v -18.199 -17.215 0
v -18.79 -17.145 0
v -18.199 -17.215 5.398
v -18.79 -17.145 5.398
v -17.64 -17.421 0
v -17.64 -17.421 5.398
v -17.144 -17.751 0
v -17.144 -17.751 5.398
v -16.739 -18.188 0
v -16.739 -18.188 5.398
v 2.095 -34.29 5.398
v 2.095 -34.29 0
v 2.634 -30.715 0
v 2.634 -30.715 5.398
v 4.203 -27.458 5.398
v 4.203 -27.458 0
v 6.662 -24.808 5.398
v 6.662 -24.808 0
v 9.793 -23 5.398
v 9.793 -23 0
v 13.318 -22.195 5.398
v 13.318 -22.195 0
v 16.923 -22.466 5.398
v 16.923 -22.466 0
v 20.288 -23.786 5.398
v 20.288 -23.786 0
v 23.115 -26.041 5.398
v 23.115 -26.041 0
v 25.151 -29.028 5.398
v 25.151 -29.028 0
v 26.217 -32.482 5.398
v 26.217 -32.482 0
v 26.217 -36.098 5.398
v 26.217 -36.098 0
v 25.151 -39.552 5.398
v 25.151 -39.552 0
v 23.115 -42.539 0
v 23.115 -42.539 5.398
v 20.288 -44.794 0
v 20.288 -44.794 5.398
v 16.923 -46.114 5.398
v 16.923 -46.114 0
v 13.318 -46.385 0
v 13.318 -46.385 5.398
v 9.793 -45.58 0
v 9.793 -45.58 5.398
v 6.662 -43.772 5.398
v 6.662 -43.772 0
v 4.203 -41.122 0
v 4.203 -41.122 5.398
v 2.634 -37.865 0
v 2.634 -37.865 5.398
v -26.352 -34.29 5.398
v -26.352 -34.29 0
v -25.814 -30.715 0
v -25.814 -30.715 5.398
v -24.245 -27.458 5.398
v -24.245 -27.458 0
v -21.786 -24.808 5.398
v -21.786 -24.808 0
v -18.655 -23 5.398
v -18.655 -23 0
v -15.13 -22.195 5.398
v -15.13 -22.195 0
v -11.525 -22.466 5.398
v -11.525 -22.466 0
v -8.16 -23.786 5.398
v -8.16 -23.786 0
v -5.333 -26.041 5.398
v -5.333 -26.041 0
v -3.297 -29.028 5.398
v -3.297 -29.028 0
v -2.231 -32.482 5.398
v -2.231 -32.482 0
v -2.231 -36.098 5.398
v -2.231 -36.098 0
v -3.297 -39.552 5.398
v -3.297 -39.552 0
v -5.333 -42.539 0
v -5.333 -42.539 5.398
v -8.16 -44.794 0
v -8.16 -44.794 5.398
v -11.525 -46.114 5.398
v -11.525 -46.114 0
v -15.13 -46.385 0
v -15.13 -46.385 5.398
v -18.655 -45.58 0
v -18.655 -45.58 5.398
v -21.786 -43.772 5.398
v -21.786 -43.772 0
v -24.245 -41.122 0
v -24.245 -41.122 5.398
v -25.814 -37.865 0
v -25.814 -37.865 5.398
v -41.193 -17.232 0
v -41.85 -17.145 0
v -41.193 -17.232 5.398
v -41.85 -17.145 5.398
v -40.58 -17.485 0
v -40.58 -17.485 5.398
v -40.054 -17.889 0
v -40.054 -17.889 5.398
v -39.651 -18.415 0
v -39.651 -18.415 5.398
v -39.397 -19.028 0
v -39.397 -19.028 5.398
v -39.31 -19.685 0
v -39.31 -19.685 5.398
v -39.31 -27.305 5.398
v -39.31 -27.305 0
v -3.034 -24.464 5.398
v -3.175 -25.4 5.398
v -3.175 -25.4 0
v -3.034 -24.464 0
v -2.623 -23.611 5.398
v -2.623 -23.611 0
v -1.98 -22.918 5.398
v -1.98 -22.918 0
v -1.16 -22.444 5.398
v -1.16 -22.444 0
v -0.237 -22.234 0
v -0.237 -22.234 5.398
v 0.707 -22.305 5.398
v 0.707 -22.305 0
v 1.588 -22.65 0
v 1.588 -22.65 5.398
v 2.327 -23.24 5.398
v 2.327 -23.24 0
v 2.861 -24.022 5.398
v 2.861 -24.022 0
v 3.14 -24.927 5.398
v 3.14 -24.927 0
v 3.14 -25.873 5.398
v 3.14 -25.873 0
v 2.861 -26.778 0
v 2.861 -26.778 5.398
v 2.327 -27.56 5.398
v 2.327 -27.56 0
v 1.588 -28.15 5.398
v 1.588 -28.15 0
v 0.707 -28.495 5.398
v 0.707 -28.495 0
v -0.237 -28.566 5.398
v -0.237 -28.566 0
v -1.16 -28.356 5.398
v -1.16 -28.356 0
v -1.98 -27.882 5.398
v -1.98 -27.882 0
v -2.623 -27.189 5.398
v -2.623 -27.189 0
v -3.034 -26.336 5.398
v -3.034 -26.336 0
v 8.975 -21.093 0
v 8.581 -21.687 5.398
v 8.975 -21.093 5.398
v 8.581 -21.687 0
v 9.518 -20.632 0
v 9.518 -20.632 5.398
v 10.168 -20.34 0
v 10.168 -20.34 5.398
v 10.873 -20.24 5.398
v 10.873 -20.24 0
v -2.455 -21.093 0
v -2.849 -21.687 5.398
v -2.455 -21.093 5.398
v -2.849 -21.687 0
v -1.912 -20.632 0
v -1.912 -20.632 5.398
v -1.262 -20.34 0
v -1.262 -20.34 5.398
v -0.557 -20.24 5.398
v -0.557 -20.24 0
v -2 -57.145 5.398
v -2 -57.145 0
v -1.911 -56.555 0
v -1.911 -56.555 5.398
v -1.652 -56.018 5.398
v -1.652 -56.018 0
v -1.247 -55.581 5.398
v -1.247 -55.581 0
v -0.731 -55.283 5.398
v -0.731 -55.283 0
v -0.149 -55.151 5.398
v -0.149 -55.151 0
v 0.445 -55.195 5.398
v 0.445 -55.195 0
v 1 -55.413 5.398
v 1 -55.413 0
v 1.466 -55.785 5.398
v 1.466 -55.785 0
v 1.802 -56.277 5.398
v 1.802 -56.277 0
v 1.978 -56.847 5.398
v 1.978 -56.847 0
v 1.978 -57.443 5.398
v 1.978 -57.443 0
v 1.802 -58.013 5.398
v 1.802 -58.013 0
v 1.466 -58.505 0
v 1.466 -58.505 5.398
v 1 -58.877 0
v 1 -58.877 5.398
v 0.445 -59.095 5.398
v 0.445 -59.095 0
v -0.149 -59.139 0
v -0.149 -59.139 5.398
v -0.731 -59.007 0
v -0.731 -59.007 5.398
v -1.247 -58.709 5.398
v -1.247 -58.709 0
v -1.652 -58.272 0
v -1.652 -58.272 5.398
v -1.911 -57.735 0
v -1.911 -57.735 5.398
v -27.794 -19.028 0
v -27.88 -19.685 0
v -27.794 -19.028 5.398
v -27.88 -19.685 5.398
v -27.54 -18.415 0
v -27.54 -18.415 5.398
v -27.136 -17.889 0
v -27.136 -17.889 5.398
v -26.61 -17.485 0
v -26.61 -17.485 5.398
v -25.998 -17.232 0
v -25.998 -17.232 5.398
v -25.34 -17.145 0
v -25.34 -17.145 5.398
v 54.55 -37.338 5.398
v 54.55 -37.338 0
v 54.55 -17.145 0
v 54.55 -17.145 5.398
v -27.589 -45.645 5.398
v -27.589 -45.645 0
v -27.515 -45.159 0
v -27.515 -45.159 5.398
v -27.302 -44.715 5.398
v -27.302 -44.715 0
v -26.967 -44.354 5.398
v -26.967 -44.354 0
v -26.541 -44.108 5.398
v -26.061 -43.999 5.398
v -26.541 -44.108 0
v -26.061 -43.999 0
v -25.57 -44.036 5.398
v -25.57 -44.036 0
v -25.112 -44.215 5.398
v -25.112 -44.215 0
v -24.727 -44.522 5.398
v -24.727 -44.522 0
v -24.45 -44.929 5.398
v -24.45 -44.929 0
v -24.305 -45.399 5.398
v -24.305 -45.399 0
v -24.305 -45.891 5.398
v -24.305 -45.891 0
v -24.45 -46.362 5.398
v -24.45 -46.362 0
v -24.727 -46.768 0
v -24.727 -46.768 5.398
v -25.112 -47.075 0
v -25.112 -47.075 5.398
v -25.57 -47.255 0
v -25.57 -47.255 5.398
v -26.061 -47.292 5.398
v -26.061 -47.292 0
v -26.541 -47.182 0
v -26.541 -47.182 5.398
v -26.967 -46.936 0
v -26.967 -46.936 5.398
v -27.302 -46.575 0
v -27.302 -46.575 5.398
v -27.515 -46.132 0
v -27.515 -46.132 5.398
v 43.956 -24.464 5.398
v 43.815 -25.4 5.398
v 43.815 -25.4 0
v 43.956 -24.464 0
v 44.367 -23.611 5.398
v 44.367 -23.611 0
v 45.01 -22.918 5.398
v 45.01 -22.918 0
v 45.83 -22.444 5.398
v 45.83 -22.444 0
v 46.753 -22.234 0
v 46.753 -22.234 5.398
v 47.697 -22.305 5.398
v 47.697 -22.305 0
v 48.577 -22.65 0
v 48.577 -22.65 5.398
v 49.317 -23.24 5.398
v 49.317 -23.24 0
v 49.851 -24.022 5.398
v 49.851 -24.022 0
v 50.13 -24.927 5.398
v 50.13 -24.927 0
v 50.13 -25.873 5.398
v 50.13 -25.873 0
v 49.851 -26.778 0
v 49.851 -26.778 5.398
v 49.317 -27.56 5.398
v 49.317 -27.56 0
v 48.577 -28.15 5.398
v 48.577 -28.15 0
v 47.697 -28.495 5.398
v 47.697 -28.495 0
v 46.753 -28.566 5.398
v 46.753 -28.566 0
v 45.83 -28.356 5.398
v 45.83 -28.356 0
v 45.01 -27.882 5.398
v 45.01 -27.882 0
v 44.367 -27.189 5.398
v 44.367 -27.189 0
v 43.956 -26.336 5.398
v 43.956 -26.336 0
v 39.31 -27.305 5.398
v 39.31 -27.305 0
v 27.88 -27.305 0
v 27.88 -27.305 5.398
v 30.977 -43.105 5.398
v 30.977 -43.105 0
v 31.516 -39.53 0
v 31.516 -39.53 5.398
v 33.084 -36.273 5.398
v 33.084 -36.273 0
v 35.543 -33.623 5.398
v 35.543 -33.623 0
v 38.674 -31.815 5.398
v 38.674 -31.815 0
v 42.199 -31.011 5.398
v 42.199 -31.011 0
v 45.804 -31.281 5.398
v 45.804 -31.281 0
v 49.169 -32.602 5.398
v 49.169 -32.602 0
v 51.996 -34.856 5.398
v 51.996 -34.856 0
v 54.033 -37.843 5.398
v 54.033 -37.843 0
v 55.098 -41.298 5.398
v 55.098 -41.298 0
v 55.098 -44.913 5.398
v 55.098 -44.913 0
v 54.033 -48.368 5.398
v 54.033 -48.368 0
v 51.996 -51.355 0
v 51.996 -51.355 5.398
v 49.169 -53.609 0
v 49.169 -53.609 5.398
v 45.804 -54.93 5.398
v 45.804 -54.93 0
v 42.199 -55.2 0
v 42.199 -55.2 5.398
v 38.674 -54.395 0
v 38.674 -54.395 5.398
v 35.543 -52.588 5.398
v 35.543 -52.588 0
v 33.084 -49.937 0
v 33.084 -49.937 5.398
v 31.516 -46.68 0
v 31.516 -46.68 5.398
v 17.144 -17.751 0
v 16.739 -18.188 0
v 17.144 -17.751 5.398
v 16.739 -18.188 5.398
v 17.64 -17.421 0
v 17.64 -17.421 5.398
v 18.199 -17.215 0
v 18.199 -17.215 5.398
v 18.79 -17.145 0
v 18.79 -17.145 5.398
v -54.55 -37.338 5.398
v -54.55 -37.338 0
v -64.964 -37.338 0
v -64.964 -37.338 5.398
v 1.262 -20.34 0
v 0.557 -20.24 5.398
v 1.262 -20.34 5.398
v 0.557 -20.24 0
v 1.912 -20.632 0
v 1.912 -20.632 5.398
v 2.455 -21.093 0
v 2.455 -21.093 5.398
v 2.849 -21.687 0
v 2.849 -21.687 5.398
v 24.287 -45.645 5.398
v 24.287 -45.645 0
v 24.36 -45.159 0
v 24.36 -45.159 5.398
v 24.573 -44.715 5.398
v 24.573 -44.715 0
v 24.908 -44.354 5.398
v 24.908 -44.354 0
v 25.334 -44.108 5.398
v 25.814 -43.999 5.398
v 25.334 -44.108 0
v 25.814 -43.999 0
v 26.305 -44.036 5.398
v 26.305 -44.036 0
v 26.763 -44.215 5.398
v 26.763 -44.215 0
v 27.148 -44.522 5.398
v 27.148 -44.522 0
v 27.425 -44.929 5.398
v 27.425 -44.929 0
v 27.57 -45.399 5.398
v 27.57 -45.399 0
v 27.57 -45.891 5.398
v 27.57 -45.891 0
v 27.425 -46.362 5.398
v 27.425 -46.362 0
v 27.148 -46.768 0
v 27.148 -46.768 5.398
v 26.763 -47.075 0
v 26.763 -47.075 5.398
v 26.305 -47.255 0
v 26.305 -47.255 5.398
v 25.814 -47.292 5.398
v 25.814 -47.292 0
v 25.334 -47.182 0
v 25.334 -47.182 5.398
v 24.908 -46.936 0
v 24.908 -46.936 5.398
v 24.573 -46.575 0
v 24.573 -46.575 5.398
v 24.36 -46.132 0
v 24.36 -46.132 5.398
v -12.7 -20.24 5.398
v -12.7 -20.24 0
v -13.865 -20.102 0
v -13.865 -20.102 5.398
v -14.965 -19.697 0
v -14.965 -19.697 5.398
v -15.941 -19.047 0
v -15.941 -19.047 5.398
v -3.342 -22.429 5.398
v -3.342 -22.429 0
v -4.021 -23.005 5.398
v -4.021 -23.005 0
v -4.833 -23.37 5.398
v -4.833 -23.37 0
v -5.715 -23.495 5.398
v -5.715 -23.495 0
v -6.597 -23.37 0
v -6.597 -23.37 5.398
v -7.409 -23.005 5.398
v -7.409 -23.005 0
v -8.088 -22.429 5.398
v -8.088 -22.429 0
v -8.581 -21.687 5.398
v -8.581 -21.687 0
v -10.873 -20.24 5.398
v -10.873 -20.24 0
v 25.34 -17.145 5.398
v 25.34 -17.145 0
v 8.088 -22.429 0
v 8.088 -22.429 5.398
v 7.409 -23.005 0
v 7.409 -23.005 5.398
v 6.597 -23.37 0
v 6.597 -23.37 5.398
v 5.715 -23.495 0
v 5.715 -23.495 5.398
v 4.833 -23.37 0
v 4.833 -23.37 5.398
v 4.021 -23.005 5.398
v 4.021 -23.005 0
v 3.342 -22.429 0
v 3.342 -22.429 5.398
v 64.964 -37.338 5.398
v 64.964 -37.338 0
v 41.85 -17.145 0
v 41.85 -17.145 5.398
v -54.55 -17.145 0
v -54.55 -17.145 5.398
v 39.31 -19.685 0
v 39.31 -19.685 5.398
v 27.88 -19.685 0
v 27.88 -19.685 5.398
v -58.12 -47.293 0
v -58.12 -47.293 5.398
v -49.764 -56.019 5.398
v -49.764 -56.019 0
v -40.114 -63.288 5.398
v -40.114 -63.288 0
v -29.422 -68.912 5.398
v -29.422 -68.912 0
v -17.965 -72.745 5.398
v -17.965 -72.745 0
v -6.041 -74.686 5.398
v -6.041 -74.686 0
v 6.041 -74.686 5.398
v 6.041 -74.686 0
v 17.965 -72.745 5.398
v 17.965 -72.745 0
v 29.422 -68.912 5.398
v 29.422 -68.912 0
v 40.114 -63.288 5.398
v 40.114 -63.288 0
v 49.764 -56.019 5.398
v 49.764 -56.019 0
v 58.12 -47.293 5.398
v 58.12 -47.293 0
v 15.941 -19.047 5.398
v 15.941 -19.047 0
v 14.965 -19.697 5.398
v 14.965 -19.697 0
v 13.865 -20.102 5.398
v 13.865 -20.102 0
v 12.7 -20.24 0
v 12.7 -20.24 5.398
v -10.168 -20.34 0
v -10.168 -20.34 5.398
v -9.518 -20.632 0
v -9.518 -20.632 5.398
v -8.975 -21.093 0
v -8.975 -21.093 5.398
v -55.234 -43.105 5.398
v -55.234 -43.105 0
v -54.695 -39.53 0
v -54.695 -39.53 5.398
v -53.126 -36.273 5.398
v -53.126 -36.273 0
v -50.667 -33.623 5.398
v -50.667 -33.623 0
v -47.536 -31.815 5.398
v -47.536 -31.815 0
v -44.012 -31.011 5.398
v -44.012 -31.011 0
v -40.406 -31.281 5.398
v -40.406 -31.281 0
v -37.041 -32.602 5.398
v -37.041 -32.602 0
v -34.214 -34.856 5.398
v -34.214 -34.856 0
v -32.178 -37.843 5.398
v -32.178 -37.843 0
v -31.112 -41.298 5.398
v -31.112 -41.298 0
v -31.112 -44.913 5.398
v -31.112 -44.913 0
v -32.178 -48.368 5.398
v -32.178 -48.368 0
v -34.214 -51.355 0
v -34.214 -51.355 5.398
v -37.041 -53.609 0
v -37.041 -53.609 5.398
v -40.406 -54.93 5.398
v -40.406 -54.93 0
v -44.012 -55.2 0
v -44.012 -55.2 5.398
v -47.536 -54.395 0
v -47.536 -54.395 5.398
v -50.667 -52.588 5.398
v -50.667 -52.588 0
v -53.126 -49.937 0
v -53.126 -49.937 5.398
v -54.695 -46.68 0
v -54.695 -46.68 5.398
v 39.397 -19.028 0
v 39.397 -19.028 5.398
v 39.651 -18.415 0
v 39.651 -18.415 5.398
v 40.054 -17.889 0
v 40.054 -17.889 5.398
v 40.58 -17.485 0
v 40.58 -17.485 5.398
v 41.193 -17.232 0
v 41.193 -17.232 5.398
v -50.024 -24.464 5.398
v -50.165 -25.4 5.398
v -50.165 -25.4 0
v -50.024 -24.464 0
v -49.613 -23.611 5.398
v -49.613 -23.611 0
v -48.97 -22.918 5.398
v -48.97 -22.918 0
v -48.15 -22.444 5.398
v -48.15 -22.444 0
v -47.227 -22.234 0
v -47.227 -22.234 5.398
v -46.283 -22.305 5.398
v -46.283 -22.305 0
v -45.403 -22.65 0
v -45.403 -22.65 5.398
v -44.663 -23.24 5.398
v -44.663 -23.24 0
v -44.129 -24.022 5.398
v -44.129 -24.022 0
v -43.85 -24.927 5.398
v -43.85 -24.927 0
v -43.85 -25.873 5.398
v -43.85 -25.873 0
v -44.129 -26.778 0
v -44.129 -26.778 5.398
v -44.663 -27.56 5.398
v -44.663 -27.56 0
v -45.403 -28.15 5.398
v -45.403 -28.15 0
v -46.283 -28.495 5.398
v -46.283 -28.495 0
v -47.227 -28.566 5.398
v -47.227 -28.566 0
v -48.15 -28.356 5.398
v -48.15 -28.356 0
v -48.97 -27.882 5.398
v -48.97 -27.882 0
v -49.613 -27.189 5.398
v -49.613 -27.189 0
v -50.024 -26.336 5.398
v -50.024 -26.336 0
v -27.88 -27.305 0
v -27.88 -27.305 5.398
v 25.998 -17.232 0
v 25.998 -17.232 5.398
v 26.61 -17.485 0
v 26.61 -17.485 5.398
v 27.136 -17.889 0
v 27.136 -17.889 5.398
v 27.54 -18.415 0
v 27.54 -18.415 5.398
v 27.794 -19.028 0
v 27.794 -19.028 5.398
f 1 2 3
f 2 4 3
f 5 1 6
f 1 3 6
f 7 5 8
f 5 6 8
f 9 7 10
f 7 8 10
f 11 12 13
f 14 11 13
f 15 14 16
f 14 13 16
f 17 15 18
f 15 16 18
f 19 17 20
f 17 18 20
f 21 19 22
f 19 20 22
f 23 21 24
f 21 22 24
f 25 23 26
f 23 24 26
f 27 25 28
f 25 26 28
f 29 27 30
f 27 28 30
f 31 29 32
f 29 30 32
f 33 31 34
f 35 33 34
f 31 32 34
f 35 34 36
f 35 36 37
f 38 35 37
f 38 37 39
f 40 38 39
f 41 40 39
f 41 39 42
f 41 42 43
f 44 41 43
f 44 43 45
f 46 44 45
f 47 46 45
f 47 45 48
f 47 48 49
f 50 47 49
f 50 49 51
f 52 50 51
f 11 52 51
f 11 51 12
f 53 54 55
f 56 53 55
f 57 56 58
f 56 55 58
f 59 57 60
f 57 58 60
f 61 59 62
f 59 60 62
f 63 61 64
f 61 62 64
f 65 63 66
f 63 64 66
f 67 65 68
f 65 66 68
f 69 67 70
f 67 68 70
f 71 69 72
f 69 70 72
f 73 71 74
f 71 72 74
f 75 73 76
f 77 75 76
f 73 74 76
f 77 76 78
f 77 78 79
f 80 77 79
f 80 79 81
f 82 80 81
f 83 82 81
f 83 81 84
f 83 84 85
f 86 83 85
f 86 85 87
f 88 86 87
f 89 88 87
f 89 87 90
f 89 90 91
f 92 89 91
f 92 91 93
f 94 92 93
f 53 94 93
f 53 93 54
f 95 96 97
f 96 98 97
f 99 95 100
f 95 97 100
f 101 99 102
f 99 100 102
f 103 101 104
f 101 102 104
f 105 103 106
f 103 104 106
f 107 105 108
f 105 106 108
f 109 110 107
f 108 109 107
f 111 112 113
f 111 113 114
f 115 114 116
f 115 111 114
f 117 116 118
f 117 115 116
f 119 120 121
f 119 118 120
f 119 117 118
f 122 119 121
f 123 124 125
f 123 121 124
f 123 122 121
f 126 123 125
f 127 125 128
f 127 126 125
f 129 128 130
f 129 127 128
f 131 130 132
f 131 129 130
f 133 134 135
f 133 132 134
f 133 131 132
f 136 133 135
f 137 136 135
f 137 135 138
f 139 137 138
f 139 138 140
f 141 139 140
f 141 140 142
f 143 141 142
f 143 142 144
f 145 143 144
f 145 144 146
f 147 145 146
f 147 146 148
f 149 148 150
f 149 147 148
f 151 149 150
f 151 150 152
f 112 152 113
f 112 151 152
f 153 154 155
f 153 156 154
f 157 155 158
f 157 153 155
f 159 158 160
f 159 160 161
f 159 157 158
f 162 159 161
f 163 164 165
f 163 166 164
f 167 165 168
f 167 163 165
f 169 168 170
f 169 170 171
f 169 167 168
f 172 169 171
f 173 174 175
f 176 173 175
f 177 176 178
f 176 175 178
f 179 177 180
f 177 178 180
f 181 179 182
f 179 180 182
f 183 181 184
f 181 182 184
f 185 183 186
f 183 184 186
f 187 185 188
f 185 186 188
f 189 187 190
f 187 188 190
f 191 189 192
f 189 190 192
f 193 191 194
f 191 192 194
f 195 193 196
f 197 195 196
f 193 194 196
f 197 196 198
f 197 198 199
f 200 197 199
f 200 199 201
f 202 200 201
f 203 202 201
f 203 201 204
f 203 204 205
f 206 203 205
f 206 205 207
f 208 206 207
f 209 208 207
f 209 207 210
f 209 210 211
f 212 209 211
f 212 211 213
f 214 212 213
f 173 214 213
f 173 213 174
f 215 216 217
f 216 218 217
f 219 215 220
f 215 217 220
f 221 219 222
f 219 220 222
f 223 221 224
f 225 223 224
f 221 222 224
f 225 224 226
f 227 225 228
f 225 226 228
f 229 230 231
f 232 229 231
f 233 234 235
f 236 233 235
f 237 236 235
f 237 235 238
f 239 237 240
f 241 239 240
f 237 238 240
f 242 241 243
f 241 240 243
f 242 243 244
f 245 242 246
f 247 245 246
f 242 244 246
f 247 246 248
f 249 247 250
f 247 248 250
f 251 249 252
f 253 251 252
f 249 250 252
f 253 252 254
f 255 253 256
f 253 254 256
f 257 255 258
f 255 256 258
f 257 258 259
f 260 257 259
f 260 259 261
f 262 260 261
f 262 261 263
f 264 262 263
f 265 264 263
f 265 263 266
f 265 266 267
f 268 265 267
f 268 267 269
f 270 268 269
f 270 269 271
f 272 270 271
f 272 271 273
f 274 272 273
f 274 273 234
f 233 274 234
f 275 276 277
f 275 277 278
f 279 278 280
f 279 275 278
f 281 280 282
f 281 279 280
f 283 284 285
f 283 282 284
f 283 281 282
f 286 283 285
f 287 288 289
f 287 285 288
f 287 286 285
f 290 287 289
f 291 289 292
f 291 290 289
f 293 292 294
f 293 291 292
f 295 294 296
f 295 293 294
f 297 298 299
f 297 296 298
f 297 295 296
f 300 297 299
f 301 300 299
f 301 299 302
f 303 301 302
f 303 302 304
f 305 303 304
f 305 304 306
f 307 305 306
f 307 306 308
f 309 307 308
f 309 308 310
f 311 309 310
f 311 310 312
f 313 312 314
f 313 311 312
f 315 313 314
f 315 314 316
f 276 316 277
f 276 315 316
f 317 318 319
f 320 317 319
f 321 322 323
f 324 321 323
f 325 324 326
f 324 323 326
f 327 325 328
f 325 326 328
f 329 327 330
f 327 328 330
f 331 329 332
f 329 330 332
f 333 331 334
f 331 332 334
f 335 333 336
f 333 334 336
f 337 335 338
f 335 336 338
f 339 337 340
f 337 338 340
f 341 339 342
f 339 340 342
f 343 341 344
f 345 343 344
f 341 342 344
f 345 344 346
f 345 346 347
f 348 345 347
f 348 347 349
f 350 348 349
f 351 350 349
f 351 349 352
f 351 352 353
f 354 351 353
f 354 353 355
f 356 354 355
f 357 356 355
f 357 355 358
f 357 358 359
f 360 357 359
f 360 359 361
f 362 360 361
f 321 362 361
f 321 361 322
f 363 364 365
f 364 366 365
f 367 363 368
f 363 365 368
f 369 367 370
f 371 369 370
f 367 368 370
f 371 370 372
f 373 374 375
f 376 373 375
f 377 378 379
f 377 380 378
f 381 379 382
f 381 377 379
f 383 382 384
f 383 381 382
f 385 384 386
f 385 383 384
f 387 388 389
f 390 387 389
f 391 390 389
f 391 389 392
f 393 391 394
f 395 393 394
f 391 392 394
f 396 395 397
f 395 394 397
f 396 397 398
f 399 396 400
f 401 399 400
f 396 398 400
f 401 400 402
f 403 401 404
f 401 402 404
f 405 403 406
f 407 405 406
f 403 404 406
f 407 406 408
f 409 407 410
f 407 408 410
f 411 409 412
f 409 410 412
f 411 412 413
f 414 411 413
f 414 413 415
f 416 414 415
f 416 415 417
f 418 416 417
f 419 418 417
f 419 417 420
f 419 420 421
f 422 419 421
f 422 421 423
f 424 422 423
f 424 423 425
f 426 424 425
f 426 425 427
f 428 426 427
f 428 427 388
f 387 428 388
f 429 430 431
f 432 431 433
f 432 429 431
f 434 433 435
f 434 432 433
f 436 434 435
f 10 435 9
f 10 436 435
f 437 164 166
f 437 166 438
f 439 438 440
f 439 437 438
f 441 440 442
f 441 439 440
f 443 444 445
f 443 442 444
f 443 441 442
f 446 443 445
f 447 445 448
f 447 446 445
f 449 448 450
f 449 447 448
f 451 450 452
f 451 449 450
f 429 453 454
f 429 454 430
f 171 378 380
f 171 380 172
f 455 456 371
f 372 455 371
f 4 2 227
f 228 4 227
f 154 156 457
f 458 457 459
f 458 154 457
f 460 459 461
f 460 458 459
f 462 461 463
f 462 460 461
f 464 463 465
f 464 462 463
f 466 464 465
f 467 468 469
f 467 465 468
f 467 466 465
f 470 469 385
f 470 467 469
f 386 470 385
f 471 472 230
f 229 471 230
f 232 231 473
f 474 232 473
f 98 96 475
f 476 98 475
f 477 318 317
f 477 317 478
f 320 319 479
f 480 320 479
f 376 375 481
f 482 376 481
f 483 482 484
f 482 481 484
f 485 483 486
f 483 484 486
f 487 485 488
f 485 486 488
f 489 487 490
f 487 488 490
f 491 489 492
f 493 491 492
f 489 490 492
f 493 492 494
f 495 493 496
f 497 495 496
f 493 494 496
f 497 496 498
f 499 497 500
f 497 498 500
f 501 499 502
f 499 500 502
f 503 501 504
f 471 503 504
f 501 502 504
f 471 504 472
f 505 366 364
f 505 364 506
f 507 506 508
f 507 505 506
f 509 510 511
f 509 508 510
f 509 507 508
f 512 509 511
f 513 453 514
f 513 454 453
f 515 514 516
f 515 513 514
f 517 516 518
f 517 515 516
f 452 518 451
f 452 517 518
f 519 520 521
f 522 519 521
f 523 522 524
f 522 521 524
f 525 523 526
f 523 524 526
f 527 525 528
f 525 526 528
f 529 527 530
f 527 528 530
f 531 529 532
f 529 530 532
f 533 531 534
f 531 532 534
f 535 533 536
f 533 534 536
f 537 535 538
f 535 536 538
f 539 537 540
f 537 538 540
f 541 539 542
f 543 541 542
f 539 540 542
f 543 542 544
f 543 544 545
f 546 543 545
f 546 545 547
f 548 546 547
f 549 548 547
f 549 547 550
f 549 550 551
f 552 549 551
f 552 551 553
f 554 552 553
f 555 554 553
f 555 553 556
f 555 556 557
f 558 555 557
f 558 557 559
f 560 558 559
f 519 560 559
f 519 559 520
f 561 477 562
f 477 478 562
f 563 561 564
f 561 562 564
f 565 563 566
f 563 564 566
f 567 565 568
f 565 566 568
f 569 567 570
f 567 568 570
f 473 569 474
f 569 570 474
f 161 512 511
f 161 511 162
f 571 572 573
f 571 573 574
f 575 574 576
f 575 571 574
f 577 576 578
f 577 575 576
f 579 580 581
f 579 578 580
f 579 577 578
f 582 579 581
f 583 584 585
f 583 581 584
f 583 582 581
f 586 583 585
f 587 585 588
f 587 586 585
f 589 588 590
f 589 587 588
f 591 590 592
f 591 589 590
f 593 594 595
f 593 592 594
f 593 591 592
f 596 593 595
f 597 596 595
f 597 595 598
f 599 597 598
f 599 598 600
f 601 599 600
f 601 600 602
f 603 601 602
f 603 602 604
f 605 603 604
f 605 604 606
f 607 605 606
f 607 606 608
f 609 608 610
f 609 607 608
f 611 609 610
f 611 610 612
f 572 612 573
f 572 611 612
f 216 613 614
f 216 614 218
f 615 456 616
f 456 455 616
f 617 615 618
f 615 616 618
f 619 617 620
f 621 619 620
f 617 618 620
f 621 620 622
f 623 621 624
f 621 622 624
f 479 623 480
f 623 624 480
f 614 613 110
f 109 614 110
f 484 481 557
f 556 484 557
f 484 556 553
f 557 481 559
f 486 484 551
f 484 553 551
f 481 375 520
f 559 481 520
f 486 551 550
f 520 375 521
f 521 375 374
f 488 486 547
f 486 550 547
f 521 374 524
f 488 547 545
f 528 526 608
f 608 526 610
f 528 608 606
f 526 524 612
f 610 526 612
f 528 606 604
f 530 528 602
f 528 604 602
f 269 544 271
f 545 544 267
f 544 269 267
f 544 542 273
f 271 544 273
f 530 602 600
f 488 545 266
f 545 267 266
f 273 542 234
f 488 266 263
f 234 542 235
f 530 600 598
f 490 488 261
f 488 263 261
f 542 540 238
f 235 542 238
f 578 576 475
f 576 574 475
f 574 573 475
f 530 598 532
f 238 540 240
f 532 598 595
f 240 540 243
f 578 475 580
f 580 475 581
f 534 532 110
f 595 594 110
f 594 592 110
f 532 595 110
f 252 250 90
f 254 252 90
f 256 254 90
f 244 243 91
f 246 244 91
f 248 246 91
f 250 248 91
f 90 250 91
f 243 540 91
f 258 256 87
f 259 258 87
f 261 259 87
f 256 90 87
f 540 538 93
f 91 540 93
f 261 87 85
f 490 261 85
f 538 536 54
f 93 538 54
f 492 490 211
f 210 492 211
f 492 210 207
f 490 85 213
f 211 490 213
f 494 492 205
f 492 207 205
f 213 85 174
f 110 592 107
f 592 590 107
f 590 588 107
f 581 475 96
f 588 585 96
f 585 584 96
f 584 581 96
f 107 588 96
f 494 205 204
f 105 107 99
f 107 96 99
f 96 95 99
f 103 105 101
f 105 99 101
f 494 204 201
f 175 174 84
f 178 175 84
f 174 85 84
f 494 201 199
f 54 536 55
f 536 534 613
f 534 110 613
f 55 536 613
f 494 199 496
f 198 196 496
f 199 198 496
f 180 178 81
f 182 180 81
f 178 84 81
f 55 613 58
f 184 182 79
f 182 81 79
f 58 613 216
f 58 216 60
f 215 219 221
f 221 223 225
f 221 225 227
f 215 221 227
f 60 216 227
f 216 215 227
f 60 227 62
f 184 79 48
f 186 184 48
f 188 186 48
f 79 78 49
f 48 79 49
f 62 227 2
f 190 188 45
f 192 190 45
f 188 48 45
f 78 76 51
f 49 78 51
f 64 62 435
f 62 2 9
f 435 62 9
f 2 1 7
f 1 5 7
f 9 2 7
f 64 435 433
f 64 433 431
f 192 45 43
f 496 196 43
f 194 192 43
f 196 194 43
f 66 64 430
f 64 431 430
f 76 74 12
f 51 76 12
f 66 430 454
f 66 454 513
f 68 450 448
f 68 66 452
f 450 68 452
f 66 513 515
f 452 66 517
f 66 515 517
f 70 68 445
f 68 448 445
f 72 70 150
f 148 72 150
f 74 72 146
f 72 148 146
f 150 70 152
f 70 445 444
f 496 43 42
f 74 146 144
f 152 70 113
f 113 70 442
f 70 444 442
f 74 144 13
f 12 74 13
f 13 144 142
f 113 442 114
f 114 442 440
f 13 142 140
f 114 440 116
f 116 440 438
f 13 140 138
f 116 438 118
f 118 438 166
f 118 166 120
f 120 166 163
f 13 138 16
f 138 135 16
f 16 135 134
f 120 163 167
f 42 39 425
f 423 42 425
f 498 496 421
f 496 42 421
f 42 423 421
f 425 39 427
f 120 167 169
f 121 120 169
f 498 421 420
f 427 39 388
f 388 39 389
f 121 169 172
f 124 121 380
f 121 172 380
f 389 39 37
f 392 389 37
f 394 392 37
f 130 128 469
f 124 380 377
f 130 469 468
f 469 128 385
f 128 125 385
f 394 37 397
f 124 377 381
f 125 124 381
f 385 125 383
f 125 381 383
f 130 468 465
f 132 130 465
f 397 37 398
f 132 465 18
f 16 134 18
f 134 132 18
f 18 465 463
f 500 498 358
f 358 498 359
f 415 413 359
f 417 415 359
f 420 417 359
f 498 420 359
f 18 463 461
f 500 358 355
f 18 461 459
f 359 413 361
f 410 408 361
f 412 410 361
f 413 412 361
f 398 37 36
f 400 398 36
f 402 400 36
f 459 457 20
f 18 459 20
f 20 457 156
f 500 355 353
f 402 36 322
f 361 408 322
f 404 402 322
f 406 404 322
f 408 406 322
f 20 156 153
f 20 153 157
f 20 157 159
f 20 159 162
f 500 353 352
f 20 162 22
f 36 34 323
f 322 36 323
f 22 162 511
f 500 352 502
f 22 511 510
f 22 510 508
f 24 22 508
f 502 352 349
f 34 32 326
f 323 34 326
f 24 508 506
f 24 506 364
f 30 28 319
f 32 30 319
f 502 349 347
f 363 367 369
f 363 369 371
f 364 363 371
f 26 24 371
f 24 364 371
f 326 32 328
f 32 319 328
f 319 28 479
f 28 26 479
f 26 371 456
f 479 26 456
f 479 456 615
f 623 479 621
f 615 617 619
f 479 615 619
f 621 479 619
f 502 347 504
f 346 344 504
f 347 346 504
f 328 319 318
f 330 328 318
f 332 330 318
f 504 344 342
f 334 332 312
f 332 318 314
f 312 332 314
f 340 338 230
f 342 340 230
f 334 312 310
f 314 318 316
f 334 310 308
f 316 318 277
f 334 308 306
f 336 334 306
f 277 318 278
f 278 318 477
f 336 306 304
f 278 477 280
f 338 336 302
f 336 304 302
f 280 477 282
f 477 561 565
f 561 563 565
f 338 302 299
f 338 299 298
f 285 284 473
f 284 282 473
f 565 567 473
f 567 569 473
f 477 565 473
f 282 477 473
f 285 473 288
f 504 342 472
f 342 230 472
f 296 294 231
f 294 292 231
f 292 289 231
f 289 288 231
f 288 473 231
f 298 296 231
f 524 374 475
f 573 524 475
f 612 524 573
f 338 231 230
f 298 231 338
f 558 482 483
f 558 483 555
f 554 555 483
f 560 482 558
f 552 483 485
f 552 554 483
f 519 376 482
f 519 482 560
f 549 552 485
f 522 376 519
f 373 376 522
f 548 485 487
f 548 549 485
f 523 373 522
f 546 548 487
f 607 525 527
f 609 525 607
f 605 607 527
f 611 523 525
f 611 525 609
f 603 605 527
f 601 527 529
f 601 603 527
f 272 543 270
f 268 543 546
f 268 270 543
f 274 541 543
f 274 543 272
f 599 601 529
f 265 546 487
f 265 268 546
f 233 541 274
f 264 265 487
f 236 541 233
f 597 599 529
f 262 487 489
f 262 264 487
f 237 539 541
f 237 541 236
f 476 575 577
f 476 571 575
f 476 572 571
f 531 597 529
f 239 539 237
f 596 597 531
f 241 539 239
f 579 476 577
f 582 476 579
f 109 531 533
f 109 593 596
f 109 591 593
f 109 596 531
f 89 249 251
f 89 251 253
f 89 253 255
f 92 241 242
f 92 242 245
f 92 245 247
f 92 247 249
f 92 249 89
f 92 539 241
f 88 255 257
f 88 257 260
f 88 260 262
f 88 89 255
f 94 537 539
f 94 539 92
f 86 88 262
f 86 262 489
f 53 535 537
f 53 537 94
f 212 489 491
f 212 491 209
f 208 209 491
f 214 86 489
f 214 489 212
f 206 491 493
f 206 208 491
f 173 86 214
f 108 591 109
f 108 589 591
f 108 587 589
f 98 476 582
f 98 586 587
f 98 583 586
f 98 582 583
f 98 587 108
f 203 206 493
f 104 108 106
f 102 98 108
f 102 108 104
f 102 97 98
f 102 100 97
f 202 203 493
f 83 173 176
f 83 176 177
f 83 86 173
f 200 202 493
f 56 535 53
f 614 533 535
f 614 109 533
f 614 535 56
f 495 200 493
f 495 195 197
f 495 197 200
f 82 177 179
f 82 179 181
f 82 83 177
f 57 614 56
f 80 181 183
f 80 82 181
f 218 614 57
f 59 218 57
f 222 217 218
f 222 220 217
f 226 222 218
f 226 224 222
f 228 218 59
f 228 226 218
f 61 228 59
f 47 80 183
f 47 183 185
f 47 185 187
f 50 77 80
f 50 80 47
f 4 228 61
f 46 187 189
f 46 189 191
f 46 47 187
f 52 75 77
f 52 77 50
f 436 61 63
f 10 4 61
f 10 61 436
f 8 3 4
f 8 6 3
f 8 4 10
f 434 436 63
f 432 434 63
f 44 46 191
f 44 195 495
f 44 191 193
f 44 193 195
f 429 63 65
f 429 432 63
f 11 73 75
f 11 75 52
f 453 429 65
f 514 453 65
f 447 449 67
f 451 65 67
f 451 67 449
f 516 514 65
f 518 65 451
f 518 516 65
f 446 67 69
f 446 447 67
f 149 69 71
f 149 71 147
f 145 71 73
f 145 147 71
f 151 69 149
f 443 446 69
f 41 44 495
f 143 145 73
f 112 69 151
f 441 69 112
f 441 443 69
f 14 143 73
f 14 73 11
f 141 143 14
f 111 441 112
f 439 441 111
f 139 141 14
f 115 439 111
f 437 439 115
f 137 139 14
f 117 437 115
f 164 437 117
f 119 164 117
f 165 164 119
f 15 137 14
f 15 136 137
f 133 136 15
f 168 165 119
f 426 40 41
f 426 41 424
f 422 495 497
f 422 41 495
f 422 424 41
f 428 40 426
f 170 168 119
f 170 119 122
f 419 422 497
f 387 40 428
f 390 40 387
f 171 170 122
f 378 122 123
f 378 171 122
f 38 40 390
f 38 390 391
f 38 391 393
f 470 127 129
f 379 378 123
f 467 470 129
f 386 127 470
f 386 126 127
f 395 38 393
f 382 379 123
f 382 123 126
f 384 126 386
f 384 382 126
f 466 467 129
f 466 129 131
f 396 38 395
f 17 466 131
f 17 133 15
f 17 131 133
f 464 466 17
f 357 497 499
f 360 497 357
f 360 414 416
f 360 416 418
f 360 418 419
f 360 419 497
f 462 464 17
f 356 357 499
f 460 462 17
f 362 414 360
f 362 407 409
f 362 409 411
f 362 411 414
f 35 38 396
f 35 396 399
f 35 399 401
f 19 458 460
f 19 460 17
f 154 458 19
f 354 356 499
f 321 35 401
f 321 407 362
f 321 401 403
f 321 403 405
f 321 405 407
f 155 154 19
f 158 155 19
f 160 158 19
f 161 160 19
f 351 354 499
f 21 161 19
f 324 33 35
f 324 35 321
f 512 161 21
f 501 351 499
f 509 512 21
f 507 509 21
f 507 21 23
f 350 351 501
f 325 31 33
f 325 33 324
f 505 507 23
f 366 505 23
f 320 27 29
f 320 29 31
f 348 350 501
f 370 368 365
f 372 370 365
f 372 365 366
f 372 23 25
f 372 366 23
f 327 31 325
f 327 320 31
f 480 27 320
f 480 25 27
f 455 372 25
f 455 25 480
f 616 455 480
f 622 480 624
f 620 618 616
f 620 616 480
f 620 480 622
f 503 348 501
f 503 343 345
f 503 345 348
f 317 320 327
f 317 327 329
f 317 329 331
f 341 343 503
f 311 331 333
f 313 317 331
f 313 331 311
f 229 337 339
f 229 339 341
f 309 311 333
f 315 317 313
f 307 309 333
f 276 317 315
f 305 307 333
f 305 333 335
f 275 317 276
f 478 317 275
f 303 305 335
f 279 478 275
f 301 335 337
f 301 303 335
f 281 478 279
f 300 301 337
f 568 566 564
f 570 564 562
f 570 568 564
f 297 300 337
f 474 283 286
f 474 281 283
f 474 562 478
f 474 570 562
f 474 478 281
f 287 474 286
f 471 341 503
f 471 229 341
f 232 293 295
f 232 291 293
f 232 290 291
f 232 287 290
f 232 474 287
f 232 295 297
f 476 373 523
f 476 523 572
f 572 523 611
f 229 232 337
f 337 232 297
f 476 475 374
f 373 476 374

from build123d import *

# Parameters (mm, degrees)
SKETCH1_R                 = 1.651
BOSS_EXTRUDE2_DEPTH       = 5.3975
SKETCH2_R                 = 1.143
CUT_EXTRUDE1_DEPTH        = 6.3975
SKETCH3_R                 = 12.1285
CUT_EXTRUDE2_DEPTH        = 6.3975
SKETCH4_W                 = 28.562713242
SKETCH4_H                 = 11.677503754
BOSS_EXTRUDE3_DEPTH       = 5.3975
SKETCH5_W                 = 216.7214489
SKETCH5_H                 = 130.569220634
CUT_EXTRUDE4_DEPTH        = 6.3975
SKETCH7_R                 = 2
CUT_EXTRUDE5_DEPTH        = 23.368
SKETCH11_W                = 11.43
SKETCH11_H                = 10.16
CUT_EXTRUDE9_DEPTH        = 6.3975
SKETCH67_R                = 1.651
CUT_EXTRUDE65_DEPTH       = 97.79
SKETCH121_R               = 3.175
CUT_EXTRUDE119_DEPTH      = 103.378
CUT_EXTRUDE119_DEPTH_BACK = 48.768
CUT_EXTRUDE12_DEPTH       = 10
FILLET1_R                 = 2.54


with BuildPart() as part:
    # Sketch1 → Boss-Extrude2 (new body)
    with BuildSketch(Plane.XY):
        with BuildLine():
            Line((-64.964441474, 37.338), (-54.550441474, 37.338))
            Line((-54.550441474, 37.338), (-54.550441474, -37.338))
            Line((-54.550441474, -37.338), (-64.964441474, -37.338))
            ThreePointArc((-64.964441474, -37.338), (0, -74.93), (64.964441474, -37.338))
            Line((64.964441474, -37.338), (54.550441474, -37.338))
            Line((54.550441474, -37.338), (54.550441474, 37.338))
            Line((54.550441474, 37.338), (64.964441474, 37.338))
            ThreePointArc((64.964441474, 37.338), (0, 74.93), (-64.964441474, 37.338))
        make_face()
        with Locations((-46.482, 11.049)):
            Circle(SKETCH1_R, mode=Mode.SUBTRACT)
        with Locations((-21.083270032, 10.795)):
            Circle(SKETCH1_R, mode=Mode.SUBTRACT)
        with Locations((-21.083270032, -10.795)):
            Circle(SKETCH1_R, mode=Mode.SUBTRACT)
        with Locations((-46.482, -11.049)):
            Circle(SKETCH1_R, mode=Mode.SUBTRACT)
        with Locations((46.482, -11.049)):
            Circle(SKETCH1_R, mode=Mode.SUBTRACT)
        with Locations((21.083270032, -10.795)):
            Circle(SKETCH1_R, mode=Mode.SUBTRACT)
        with Locations((21.083270032, 10.795)):
            Circle(SKETCH1_R, mode=Mode.SUBTRACT)
        with Locations((46.482, 11.049)):
            Circle(SKETCH1_R, mode=Mode.SUBTRACT)
    extrude(amount=BOSS_EXTRUDE2_DEPTH)

    # Sketch2 → Cut-Extrude1 (cut, through all)
    with BuildSketch(Plane.XY.offset(5.3975)):
        with Locations((-6.731, 62.23)):
            Circle(SKETCH2_R)
        with Locations((6.731, 62.23)):
            Circle(SKETCH2_R)
    extrude(amount=-CUT_EXTRUDE1_DEPTH, mode=Mode.SUBTRACT)

    # Sketch3 → Cut-Extrude2 (cut, through all)
    with BuildSketch(Plane(origin=(0, 0, 0), x_dir=(-1, 0, 0), z_dir=(0, 0, -1))):
        with Locations((-43.105229381, -43.105229381)):
            Circle(SKETCH3_R)
        with Locations((14.224, -34.29)):
            Circle(SKETCH3_R)
        with Locations((14.224, 34.29)):
            Circle(SKETCH3_R)
        with Locations((-43.105229381, 43.105229381)):
            Circle(SKETCH3_R)
        with Locations((43.105229381, 43.105229381)):
            Circle(SKETCH3_R)
        with Locations((-14.224, 34.29)):
            Circle(SKETCH3_R)
        with Locations((-14.224, -34.29)):
            Circle(SKETCH3_R)
        with Locations((43.105229381, -43.105229381)):
            Circle(SKETCH3_R)
    extrude(amount=-CUT_EXTRUDE2_DEPTH, mode=Mode.SUBTRACT)

    # Sketch4 → Boss-Extrude3 (add)
    with BuildSketch(Plane(origin=(0, 0, 0), x_dir=(-1, 0, 0), z_dir=(0, 0, -1))):
        with Locations((-1.488809975, 62.152540216)):
            Rectangle(SKETCH4_W, SKETCH4_H)
    extrude(amount=-BOSS_EXTRUDE3_DEPTH)

    # Sketch5 → Cut-Extrude4 (cut, through all)
    with BuildSketch(Plane(origin=(0, 0, 0), x_dir=(-1, 0, 0), z_dir=(0, 0, -1))):
        with Locations((23.316688373, 48.139610317)):
            Rectangle(SKETCH5_W, SKETCH5_H)
    extrude(amount=-CUT_EXTRUDE4_DEPTH, mode=Mode.SUBTRACT)

    # Sketch7 → Cut-Extrude5 (cut)
    with BuildSketch(Plane(origin=(0, 0, 0), x_dir=(-1, 0, 0), z_dir=(0, 0, -1))):
        with Locations((0, -57.145)):
            Circle(SKETCH7_R)
    extrude(amount=-CUT_EXTRUDE5_DEPTH, mode=Mode.SUBTRACT)

    # Sketch11 → Cut-Extrude9 (cut, through all)
    with BuildSketch(Plane(origin=(0, 0, 0), x_dir=(-1, 0, 0), z_dir=(0, 0, -1))):
        with Locations((-33.595441474, -22.225)):
            Rectangle(SKETCH11_W, SKETCH11_H)
        with Locations((33.595441474, -22.225)):
            Rectangle(SKETCH11_W, SKETCH11_H)
    extrude(amount=-CUT_EXTRUDE9_DEPTH, mode=Mode.SUBTRACT)

    # Sketch67 → Cut-Extrude65 (cut)
    with BuildSketch(Plane(origin=(30.092005081, 4.08352975, -19.2405), x_dir=(-1, 0, 0), z_dir=(0, 0, -1))):
        with Locations((4.154396091, -49.728759131)):
            Circle(SKETCH67_R)
        with Locations((56.02961407, -49.728759131)):
            Circle(SKETCH67_R)
    extrude(amount=-CUT_EXTRUDE65_DEPTH, mode=Mode.SUBTRACT)

    # Sketch121 → Cut-Extrude119 (cut, two sides)
    with BuildSketch(Plane(origin=(30.092005081, 4.08352975, 16.891), x_dir=(-1, 0, 0), z_dir=(0, 0, -1))) as cut_extrude119_sk:
        with Locations((77.082005081, -29.48352975)):
            Circle(SKETCH121_R)
        with Locations((30.092005081, -29.48352975)):
            Circle(SKETCH121_R)
        with Locations((-16.897994919, -29.48352975)):
            Circle(SKETCH121_R)
    extrude(amount=CUT_EXTRUDE119_DEPTH, mode=Mode.SUBTRACT)
    extrude(cut_extrude119_sk.sketch, amount=-CUT_EXTRUDE119_DEPTH_BACK, mode=Mode.SUBTRACT)

    # Sketch14 → Cut-Extrude12 (cut)
    with BuildSketch(Plane.XY.offset(5.3975)):
        with BuildLine():
            Line((12.7, -20.24), (8.888991966, -20.24))
            ThreePointArc((8.888991966, -20.24), (5.715, -23.495), (2.541008034, -20.24))
            Line((2.541008034, -20.24), (-2.541008034, -20.24))
            ThreePointArc((-2.541008034, -20.24), (-5.715, -23.495), (-8.888991966, -20.24))
            Line((-8.888991966, -20.24), (-12.7, -20.24))
            ThreePointArc((-12.7, -20.24), (-16.235533906, -11.704466094), (-7.7, -15.24))
            Line((-7.7, -15.24), (7.7, -15.24))
            ThreePointArc((7.7, -15.24), (16.235533906, -11.704466094), (12.7, -20.24))
        make_face()
    extrude(amount=-CUT_EXTRUDE12_DEPTH, mode=Mode.SUBTRACT)

    # Fillet1
    fillet1_edges = [part.edges().sort_by_distance(p)[0] for p in [
        (39.310441474, -17.145, 2.69875),
        (27.880441474, -17.145, 2.69875),
        (-27.880441474, -17.145, 2.69875),
        (-39.310441474, -17.145, 2.69875),
        (-2.541008034, -20.24, 2.69875),
        (-8.888991966, -20.24, 2.69875),
        (-17.322875188, -17.145, 2.69875),
        (17.322875188, -17.145, 2.69875),
        (8.888991966, -20.24, 2.69875),
        (2.541008034, -20.24, 2.69875),
    ]]
    fillet(fillet1_edges, radius=FILLET1_R)


solid = part.part
